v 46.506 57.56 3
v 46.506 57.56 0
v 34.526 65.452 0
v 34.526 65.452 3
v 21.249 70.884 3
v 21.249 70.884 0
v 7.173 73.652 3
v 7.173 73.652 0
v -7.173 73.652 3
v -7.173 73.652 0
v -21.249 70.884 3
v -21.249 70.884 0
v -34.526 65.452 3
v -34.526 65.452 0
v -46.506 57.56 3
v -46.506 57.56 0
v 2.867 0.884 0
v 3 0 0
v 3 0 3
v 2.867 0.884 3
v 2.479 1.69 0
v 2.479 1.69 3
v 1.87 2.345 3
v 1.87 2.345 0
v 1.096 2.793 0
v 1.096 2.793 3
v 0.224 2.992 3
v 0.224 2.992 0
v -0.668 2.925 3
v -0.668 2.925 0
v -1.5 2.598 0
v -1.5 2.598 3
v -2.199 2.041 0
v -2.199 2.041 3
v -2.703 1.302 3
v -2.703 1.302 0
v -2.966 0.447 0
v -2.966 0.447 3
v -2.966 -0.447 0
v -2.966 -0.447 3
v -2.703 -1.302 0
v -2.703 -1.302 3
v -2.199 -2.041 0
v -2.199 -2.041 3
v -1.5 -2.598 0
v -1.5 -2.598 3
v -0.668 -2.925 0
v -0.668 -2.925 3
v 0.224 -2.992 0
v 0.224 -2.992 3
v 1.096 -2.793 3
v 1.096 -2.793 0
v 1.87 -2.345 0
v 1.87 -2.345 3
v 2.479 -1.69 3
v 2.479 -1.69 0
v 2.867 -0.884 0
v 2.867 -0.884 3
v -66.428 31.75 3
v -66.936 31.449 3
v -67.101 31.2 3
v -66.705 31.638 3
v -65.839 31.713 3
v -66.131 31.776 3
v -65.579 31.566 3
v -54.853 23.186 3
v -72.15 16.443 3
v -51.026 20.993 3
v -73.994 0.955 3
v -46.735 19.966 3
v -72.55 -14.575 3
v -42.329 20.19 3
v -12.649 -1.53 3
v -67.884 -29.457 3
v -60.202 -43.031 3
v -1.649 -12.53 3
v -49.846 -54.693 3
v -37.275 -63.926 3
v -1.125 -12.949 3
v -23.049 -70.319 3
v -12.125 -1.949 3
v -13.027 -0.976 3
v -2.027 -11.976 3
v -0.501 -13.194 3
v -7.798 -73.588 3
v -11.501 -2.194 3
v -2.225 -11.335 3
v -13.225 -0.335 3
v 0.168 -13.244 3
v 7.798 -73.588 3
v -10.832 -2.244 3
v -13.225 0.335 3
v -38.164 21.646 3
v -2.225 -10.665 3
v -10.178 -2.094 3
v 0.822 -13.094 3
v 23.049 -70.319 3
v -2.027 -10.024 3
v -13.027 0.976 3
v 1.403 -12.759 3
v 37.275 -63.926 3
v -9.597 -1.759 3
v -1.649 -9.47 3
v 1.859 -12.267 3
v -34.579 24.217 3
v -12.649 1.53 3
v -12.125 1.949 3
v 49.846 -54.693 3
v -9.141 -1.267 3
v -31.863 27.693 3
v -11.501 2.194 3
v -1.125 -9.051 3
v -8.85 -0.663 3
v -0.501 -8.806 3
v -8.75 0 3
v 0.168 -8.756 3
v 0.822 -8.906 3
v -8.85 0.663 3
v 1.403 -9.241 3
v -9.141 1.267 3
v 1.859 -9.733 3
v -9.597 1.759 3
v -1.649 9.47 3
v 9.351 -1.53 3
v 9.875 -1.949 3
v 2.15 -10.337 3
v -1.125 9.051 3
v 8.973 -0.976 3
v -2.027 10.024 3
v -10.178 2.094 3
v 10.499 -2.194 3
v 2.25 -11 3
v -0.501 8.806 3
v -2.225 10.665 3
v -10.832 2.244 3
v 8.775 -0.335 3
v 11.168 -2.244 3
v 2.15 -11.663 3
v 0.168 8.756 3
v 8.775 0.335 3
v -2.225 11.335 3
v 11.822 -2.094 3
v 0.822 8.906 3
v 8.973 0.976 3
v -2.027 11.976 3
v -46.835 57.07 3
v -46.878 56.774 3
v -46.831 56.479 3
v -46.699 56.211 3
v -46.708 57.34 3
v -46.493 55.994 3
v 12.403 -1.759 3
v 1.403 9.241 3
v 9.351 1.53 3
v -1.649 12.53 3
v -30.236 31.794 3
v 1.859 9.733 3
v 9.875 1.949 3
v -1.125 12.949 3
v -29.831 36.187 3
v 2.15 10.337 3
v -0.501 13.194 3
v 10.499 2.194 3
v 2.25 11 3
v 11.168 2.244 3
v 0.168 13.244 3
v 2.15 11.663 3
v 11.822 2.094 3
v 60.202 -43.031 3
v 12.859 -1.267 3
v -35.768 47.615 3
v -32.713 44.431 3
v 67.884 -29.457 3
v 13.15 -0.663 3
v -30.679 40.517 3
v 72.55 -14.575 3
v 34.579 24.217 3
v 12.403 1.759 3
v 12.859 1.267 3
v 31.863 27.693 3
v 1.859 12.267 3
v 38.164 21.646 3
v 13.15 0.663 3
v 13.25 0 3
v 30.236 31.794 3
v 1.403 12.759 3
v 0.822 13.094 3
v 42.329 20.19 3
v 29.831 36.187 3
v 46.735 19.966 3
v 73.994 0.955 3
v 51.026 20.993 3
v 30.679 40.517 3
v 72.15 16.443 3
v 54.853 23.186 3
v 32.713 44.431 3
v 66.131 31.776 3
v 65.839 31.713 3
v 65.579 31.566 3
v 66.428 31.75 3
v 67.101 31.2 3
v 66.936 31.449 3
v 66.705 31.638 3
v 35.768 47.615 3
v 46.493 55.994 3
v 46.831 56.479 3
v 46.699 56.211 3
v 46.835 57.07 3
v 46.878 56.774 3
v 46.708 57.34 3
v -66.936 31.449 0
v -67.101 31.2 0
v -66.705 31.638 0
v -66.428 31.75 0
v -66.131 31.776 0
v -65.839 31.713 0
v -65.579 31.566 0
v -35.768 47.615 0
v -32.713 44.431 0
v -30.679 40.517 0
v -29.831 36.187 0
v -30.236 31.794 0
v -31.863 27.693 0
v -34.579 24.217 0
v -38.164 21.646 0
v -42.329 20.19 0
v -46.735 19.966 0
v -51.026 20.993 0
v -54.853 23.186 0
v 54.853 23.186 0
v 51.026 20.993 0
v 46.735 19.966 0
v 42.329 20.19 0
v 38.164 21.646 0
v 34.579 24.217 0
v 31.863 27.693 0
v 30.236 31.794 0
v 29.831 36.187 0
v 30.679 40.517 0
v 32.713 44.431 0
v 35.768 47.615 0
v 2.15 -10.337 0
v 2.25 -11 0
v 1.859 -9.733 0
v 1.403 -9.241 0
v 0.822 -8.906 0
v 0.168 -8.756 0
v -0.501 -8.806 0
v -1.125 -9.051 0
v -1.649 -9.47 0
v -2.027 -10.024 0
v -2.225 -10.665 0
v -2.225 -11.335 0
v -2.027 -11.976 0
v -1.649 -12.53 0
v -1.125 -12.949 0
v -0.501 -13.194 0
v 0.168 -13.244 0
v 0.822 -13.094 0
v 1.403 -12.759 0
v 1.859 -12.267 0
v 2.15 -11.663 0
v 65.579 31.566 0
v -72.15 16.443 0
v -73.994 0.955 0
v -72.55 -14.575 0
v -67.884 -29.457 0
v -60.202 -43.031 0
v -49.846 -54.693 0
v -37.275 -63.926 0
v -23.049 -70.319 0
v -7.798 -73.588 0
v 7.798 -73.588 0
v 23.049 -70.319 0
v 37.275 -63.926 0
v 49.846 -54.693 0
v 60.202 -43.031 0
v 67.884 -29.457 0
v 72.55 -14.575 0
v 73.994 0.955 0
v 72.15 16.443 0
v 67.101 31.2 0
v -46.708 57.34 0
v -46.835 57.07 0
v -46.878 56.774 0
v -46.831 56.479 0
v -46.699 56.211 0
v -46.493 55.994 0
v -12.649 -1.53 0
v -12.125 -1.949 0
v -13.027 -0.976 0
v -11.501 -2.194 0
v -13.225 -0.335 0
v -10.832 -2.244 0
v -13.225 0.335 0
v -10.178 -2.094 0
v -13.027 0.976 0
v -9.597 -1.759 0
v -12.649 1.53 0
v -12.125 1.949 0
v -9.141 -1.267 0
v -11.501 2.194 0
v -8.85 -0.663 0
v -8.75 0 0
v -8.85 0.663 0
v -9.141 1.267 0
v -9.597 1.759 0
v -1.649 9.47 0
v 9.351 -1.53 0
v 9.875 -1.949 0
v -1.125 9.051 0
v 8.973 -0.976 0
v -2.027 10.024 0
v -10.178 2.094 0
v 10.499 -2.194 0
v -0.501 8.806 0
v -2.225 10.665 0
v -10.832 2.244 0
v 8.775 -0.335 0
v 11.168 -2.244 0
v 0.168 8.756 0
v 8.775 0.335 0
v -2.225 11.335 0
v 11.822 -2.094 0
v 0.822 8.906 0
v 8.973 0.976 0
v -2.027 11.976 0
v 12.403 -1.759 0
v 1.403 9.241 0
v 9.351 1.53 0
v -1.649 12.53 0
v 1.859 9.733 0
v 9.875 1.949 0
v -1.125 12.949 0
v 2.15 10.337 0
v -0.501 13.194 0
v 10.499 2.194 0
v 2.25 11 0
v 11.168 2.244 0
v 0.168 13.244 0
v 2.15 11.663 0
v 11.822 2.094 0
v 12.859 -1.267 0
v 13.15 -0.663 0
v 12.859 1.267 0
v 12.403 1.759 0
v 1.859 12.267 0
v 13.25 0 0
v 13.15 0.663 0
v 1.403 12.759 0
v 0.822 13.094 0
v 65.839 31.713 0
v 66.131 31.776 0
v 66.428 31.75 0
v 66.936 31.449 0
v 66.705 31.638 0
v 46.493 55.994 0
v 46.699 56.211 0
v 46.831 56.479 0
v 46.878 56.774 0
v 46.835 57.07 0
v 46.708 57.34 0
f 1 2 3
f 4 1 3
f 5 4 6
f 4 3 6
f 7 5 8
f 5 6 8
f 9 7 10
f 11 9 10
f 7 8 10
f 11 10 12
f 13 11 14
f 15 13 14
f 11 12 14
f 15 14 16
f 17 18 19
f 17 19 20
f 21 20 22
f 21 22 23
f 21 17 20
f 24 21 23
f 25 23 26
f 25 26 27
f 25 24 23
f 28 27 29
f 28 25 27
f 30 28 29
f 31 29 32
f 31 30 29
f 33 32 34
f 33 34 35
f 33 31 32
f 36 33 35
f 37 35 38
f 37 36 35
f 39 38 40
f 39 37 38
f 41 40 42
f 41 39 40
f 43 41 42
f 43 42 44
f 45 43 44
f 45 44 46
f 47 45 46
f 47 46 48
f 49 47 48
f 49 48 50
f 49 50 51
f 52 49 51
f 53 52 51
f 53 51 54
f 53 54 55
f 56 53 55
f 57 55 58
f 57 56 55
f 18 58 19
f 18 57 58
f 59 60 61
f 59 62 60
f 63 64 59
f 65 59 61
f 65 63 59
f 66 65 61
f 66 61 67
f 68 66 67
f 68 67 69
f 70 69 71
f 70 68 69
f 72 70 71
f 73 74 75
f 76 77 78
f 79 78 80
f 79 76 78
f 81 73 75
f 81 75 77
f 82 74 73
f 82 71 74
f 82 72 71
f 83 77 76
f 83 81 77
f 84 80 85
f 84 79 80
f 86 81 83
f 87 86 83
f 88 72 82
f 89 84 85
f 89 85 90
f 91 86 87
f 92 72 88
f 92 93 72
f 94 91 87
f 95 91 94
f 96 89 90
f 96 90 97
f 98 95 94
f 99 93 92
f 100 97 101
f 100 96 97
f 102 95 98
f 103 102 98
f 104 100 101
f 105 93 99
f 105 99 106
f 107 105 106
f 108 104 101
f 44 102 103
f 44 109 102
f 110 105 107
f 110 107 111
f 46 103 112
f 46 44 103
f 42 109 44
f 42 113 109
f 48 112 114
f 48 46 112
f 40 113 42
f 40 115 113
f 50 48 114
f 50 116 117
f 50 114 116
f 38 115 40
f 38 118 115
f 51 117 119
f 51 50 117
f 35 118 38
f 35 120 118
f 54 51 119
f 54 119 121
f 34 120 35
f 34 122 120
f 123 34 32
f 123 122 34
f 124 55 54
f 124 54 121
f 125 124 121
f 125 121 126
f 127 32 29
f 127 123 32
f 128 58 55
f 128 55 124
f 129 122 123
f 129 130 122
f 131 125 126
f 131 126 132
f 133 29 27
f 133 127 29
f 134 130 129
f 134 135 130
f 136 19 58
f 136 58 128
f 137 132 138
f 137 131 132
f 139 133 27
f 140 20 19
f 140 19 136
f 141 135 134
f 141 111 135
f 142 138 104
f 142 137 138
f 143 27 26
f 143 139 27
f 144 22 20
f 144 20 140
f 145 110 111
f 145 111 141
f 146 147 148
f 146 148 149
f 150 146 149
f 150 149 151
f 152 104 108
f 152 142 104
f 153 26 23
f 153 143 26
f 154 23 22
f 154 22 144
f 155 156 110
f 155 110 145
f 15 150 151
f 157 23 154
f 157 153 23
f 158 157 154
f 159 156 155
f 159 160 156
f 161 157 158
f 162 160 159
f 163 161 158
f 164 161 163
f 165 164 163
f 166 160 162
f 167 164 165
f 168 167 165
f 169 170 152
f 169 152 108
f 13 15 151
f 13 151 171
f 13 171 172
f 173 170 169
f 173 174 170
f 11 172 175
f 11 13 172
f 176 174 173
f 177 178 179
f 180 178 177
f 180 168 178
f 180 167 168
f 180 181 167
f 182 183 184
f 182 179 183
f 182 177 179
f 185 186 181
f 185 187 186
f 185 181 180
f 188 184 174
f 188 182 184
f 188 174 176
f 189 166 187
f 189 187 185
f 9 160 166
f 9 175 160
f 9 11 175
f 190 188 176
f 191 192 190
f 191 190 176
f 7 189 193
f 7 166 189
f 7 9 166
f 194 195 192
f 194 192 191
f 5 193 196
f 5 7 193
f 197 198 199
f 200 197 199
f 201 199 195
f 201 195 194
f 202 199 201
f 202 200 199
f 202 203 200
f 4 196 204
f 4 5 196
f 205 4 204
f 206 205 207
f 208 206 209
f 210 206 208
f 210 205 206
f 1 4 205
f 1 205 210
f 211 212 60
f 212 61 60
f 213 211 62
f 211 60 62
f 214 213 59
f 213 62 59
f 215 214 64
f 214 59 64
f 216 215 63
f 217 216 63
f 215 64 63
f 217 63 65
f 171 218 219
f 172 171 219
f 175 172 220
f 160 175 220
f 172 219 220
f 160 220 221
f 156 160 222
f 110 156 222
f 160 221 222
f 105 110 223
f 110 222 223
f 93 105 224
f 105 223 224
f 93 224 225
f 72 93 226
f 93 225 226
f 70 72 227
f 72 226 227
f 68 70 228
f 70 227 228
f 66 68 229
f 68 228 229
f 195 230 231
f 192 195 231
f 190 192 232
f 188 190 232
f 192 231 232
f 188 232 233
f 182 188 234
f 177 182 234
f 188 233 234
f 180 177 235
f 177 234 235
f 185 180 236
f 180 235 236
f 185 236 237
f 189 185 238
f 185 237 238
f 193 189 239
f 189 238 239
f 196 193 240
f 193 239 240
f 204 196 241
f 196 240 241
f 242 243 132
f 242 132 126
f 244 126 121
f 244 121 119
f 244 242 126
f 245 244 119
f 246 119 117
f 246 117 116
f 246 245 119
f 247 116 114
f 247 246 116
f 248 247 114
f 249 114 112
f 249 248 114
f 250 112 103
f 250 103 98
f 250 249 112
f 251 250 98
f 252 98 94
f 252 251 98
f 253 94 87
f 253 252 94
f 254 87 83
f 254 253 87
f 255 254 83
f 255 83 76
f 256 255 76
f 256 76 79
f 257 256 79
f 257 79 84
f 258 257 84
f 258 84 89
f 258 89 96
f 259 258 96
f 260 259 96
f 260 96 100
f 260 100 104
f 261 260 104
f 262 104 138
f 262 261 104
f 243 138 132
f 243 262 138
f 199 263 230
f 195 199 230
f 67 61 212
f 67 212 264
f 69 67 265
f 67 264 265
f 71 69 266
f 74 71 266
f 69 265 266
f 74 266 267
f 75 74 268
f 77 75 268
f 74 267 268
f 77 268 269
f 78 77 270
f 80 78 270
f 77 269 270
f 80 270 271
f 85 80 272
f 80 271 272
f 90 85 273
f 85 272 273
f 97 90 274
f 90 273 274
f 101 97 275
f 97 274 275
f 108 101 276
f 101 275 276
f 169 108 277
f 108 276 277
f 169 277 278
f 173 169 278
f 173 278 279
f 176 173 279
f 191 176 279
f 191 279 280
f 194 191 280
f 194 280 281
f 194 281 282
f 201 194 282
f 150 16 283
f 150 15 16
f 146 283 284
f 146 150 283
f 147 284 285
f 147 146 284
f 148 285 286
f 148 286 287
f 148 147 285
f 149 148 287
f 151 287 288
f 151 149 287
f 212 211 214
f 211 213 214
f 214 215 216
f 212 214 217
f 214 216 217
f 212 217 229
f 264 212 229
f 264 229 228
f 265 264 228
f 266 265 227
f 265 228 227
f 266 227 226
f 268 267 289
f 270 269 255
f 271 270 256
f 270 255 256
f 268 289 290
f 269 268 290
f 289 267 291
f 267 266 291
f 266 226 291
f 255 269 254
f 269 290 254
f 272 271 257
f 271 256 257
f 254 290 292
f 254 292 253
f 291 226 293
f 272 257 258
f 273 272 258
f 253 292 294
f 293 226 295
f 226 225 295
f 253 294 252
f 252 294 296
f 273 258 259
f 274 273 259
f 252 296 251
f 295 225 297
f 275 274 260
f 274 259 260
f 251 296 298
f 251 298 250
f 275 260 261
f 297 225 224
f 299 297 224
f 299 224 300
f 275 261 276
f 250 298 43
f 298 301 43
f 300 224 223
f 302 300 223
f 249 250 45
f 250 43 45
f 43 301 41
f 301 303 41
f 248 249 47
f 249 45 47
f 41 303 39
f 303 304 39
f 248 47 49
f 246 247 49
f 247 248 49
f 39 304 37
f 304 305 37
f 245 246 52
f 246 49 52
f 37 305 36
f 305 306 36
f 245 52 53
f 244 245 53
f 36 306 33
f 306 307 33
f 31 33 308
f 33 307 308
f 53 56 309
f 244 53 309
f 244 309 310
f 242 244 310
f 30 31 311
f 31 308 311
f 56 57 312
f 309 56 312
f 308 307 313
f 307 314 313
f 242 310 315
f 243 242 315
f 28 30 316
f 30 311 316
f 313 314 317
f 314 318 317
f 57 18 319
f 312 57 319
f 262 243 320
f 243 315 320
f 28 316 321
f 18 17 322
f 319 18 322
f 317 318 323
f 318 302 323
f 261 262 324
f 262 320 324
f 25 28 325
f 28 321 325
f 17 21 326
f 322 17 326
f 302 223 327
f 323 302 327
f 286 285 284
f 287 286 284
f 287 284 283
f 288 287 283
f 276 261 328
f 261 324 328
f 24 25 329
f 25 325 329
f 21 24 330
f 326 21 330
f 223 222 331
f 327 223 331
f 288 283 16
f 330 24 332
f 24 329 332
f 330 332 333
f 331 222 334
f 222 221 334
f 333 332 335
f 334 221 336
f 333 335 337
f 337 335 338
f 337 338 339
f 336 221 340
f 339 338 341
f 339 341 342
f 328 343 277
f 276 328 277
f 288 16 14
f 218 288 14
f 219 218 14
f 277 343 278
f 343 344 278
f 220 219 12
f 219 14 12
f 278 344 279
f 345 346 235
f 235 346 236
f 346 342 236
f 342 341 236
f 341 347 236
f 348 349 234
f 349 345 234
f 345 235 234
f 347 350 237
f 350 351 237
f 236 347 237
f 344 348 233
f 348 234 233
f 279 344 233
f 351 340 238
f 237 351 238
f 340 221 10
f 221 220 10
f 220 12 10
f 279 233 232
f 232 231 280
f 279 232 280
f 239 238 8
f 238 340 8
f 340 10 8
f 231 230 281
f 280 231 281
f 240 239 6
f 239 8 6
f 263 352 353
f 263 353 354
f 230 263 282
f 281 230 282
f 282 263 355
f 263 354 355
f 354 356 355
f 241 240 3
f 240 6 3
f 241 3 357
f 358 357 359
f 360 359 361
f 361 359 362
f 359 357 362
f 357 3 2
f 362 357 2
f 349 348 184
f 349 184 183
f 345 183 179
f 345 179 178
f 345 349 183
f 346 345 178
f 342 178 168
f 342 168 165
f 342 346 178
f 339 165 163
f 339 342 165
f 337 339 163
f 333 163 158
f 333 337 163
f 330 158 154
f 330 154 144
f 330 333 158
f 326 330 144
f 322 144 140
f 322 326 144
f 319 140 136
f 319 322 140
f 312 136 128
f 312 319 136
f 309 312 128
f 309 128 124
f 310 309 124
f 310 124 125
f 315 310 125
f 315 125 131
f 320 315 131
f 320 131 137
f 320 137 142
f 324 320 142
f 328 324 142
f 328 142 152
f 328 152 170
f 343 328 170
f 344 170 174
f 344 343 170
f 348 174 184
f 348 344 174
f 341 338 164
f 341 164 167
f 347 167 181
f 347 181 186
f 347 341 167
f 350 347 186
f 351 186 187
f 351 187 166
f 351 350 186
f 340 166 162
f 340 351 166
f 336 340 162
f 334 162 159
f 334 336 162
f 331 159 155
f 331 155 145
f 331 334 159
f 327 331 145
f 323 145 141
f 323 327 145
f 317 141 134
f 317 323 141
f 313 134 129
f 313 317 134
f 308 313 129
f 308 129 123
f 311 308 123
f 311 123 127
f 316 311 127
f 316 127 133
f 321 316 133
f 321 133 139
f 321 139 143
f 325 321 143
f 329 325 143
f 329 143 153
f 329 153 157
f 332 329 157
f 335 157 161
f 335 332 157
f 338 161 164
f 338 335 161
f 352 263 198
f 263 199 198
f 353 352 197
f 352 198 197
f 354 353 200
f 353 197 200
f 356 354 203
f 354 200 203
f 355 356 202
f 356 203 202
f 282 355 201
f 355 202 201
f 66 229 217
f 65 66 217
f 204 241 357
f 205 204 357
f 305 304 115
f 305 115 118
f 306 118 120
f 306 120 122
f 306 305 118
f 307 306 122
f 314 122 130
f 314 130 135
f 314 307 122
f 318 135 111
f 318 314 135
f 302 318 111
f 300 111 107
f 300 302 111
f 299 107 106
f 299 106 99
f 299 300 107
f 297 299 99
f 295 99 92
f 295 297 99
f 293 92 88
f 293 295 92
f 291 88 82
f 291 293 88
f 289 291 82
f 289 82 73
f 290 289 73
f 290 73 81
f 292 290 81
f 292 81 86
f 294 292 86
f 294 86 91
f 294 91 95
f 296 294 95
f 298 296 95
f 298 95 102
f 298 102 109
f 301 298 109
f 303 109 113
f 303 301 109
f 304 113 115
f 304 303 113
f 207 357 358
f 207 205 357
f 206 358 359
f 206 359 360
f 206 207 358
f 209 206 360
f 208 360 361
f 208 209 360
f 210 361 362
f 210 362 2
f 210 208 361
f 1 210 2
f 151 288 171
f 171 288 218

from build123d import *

# Parameters (mm, degrees)
ESQUISSE1_R        = 2.25
ESQUISSE1_R_2      = 3
BOSS_EXTRU_1_DEPTH = 3
CONG_3_R           = 1


with BuildPart() as part:
    # Esquisse1 → Boss.-Extru.1 (new body)
    with BuildSketch(Plane.XY):
        with BuildLine():
            Line((66.562015248, 32.334163451), (54.8533712, 23.18636815))
            ThreePointArc((54.8533712, 23.18636815), (33.096451651, 25.857781964), (35.767865465, 47.614701512))
            Line((35.767865465, 47.614701512), (47.476509513, 56.762496813))
            ThreePointArc((47.476509513, 56.762496813), (0, 74), (-47.476509513, 56.762496813))
            Line((-47.476509513, 56.762496813), (-35.767865465, 47.614701512))
            ThreePointArc((-35.767865465, 47.614701512), (-33.096451651, 25.857781964), (-54.8533712, 23.18636815))
            Line((-54.8533712, 23.18636815), (-66.562015248, 32.334163451))
            ThreePointArc((-66.562015248, 32.334163451), (0, -74), (66.562015248, 32.334163451))
        make_face()
        with Locations((0, 11)):
            Circle(ESQUISSE1_R, mode=Mode.SUBTRACT)
        with Locations((11, 0)):
            Circle(ESQUISSE1_R, mode=Mode.SUBTRACT)
        with Locations((0, -11)):
            Circle(ESQUISSE1_R, mode=Mode.SUBTRACT)
        with Locations((-11, 0)):
            Circle(ESQUISSE1_R, mode=Mode.SUBTRACT)
        Circle(ESQUISSE1_R_2, mode=Mode.SUBTRACT)
    extrude(amount=BOSS_EXTRU_1_DEPTH)

    # Congé3
    cong_3_edges = [part.edges().sort_by_distance(p)[0] for p in [
        (-66.562015248, 32.334163451, 1.5),
        (-47.476509513, 56.762496813, 1.5),
        (47.476509513, 56.762496813, 1.5),
        (66.562015248, 32.334163451, 1.5),
    ]]
    fillet(cong_3_edges, radius=CONG_3_R)


solid = part.part
